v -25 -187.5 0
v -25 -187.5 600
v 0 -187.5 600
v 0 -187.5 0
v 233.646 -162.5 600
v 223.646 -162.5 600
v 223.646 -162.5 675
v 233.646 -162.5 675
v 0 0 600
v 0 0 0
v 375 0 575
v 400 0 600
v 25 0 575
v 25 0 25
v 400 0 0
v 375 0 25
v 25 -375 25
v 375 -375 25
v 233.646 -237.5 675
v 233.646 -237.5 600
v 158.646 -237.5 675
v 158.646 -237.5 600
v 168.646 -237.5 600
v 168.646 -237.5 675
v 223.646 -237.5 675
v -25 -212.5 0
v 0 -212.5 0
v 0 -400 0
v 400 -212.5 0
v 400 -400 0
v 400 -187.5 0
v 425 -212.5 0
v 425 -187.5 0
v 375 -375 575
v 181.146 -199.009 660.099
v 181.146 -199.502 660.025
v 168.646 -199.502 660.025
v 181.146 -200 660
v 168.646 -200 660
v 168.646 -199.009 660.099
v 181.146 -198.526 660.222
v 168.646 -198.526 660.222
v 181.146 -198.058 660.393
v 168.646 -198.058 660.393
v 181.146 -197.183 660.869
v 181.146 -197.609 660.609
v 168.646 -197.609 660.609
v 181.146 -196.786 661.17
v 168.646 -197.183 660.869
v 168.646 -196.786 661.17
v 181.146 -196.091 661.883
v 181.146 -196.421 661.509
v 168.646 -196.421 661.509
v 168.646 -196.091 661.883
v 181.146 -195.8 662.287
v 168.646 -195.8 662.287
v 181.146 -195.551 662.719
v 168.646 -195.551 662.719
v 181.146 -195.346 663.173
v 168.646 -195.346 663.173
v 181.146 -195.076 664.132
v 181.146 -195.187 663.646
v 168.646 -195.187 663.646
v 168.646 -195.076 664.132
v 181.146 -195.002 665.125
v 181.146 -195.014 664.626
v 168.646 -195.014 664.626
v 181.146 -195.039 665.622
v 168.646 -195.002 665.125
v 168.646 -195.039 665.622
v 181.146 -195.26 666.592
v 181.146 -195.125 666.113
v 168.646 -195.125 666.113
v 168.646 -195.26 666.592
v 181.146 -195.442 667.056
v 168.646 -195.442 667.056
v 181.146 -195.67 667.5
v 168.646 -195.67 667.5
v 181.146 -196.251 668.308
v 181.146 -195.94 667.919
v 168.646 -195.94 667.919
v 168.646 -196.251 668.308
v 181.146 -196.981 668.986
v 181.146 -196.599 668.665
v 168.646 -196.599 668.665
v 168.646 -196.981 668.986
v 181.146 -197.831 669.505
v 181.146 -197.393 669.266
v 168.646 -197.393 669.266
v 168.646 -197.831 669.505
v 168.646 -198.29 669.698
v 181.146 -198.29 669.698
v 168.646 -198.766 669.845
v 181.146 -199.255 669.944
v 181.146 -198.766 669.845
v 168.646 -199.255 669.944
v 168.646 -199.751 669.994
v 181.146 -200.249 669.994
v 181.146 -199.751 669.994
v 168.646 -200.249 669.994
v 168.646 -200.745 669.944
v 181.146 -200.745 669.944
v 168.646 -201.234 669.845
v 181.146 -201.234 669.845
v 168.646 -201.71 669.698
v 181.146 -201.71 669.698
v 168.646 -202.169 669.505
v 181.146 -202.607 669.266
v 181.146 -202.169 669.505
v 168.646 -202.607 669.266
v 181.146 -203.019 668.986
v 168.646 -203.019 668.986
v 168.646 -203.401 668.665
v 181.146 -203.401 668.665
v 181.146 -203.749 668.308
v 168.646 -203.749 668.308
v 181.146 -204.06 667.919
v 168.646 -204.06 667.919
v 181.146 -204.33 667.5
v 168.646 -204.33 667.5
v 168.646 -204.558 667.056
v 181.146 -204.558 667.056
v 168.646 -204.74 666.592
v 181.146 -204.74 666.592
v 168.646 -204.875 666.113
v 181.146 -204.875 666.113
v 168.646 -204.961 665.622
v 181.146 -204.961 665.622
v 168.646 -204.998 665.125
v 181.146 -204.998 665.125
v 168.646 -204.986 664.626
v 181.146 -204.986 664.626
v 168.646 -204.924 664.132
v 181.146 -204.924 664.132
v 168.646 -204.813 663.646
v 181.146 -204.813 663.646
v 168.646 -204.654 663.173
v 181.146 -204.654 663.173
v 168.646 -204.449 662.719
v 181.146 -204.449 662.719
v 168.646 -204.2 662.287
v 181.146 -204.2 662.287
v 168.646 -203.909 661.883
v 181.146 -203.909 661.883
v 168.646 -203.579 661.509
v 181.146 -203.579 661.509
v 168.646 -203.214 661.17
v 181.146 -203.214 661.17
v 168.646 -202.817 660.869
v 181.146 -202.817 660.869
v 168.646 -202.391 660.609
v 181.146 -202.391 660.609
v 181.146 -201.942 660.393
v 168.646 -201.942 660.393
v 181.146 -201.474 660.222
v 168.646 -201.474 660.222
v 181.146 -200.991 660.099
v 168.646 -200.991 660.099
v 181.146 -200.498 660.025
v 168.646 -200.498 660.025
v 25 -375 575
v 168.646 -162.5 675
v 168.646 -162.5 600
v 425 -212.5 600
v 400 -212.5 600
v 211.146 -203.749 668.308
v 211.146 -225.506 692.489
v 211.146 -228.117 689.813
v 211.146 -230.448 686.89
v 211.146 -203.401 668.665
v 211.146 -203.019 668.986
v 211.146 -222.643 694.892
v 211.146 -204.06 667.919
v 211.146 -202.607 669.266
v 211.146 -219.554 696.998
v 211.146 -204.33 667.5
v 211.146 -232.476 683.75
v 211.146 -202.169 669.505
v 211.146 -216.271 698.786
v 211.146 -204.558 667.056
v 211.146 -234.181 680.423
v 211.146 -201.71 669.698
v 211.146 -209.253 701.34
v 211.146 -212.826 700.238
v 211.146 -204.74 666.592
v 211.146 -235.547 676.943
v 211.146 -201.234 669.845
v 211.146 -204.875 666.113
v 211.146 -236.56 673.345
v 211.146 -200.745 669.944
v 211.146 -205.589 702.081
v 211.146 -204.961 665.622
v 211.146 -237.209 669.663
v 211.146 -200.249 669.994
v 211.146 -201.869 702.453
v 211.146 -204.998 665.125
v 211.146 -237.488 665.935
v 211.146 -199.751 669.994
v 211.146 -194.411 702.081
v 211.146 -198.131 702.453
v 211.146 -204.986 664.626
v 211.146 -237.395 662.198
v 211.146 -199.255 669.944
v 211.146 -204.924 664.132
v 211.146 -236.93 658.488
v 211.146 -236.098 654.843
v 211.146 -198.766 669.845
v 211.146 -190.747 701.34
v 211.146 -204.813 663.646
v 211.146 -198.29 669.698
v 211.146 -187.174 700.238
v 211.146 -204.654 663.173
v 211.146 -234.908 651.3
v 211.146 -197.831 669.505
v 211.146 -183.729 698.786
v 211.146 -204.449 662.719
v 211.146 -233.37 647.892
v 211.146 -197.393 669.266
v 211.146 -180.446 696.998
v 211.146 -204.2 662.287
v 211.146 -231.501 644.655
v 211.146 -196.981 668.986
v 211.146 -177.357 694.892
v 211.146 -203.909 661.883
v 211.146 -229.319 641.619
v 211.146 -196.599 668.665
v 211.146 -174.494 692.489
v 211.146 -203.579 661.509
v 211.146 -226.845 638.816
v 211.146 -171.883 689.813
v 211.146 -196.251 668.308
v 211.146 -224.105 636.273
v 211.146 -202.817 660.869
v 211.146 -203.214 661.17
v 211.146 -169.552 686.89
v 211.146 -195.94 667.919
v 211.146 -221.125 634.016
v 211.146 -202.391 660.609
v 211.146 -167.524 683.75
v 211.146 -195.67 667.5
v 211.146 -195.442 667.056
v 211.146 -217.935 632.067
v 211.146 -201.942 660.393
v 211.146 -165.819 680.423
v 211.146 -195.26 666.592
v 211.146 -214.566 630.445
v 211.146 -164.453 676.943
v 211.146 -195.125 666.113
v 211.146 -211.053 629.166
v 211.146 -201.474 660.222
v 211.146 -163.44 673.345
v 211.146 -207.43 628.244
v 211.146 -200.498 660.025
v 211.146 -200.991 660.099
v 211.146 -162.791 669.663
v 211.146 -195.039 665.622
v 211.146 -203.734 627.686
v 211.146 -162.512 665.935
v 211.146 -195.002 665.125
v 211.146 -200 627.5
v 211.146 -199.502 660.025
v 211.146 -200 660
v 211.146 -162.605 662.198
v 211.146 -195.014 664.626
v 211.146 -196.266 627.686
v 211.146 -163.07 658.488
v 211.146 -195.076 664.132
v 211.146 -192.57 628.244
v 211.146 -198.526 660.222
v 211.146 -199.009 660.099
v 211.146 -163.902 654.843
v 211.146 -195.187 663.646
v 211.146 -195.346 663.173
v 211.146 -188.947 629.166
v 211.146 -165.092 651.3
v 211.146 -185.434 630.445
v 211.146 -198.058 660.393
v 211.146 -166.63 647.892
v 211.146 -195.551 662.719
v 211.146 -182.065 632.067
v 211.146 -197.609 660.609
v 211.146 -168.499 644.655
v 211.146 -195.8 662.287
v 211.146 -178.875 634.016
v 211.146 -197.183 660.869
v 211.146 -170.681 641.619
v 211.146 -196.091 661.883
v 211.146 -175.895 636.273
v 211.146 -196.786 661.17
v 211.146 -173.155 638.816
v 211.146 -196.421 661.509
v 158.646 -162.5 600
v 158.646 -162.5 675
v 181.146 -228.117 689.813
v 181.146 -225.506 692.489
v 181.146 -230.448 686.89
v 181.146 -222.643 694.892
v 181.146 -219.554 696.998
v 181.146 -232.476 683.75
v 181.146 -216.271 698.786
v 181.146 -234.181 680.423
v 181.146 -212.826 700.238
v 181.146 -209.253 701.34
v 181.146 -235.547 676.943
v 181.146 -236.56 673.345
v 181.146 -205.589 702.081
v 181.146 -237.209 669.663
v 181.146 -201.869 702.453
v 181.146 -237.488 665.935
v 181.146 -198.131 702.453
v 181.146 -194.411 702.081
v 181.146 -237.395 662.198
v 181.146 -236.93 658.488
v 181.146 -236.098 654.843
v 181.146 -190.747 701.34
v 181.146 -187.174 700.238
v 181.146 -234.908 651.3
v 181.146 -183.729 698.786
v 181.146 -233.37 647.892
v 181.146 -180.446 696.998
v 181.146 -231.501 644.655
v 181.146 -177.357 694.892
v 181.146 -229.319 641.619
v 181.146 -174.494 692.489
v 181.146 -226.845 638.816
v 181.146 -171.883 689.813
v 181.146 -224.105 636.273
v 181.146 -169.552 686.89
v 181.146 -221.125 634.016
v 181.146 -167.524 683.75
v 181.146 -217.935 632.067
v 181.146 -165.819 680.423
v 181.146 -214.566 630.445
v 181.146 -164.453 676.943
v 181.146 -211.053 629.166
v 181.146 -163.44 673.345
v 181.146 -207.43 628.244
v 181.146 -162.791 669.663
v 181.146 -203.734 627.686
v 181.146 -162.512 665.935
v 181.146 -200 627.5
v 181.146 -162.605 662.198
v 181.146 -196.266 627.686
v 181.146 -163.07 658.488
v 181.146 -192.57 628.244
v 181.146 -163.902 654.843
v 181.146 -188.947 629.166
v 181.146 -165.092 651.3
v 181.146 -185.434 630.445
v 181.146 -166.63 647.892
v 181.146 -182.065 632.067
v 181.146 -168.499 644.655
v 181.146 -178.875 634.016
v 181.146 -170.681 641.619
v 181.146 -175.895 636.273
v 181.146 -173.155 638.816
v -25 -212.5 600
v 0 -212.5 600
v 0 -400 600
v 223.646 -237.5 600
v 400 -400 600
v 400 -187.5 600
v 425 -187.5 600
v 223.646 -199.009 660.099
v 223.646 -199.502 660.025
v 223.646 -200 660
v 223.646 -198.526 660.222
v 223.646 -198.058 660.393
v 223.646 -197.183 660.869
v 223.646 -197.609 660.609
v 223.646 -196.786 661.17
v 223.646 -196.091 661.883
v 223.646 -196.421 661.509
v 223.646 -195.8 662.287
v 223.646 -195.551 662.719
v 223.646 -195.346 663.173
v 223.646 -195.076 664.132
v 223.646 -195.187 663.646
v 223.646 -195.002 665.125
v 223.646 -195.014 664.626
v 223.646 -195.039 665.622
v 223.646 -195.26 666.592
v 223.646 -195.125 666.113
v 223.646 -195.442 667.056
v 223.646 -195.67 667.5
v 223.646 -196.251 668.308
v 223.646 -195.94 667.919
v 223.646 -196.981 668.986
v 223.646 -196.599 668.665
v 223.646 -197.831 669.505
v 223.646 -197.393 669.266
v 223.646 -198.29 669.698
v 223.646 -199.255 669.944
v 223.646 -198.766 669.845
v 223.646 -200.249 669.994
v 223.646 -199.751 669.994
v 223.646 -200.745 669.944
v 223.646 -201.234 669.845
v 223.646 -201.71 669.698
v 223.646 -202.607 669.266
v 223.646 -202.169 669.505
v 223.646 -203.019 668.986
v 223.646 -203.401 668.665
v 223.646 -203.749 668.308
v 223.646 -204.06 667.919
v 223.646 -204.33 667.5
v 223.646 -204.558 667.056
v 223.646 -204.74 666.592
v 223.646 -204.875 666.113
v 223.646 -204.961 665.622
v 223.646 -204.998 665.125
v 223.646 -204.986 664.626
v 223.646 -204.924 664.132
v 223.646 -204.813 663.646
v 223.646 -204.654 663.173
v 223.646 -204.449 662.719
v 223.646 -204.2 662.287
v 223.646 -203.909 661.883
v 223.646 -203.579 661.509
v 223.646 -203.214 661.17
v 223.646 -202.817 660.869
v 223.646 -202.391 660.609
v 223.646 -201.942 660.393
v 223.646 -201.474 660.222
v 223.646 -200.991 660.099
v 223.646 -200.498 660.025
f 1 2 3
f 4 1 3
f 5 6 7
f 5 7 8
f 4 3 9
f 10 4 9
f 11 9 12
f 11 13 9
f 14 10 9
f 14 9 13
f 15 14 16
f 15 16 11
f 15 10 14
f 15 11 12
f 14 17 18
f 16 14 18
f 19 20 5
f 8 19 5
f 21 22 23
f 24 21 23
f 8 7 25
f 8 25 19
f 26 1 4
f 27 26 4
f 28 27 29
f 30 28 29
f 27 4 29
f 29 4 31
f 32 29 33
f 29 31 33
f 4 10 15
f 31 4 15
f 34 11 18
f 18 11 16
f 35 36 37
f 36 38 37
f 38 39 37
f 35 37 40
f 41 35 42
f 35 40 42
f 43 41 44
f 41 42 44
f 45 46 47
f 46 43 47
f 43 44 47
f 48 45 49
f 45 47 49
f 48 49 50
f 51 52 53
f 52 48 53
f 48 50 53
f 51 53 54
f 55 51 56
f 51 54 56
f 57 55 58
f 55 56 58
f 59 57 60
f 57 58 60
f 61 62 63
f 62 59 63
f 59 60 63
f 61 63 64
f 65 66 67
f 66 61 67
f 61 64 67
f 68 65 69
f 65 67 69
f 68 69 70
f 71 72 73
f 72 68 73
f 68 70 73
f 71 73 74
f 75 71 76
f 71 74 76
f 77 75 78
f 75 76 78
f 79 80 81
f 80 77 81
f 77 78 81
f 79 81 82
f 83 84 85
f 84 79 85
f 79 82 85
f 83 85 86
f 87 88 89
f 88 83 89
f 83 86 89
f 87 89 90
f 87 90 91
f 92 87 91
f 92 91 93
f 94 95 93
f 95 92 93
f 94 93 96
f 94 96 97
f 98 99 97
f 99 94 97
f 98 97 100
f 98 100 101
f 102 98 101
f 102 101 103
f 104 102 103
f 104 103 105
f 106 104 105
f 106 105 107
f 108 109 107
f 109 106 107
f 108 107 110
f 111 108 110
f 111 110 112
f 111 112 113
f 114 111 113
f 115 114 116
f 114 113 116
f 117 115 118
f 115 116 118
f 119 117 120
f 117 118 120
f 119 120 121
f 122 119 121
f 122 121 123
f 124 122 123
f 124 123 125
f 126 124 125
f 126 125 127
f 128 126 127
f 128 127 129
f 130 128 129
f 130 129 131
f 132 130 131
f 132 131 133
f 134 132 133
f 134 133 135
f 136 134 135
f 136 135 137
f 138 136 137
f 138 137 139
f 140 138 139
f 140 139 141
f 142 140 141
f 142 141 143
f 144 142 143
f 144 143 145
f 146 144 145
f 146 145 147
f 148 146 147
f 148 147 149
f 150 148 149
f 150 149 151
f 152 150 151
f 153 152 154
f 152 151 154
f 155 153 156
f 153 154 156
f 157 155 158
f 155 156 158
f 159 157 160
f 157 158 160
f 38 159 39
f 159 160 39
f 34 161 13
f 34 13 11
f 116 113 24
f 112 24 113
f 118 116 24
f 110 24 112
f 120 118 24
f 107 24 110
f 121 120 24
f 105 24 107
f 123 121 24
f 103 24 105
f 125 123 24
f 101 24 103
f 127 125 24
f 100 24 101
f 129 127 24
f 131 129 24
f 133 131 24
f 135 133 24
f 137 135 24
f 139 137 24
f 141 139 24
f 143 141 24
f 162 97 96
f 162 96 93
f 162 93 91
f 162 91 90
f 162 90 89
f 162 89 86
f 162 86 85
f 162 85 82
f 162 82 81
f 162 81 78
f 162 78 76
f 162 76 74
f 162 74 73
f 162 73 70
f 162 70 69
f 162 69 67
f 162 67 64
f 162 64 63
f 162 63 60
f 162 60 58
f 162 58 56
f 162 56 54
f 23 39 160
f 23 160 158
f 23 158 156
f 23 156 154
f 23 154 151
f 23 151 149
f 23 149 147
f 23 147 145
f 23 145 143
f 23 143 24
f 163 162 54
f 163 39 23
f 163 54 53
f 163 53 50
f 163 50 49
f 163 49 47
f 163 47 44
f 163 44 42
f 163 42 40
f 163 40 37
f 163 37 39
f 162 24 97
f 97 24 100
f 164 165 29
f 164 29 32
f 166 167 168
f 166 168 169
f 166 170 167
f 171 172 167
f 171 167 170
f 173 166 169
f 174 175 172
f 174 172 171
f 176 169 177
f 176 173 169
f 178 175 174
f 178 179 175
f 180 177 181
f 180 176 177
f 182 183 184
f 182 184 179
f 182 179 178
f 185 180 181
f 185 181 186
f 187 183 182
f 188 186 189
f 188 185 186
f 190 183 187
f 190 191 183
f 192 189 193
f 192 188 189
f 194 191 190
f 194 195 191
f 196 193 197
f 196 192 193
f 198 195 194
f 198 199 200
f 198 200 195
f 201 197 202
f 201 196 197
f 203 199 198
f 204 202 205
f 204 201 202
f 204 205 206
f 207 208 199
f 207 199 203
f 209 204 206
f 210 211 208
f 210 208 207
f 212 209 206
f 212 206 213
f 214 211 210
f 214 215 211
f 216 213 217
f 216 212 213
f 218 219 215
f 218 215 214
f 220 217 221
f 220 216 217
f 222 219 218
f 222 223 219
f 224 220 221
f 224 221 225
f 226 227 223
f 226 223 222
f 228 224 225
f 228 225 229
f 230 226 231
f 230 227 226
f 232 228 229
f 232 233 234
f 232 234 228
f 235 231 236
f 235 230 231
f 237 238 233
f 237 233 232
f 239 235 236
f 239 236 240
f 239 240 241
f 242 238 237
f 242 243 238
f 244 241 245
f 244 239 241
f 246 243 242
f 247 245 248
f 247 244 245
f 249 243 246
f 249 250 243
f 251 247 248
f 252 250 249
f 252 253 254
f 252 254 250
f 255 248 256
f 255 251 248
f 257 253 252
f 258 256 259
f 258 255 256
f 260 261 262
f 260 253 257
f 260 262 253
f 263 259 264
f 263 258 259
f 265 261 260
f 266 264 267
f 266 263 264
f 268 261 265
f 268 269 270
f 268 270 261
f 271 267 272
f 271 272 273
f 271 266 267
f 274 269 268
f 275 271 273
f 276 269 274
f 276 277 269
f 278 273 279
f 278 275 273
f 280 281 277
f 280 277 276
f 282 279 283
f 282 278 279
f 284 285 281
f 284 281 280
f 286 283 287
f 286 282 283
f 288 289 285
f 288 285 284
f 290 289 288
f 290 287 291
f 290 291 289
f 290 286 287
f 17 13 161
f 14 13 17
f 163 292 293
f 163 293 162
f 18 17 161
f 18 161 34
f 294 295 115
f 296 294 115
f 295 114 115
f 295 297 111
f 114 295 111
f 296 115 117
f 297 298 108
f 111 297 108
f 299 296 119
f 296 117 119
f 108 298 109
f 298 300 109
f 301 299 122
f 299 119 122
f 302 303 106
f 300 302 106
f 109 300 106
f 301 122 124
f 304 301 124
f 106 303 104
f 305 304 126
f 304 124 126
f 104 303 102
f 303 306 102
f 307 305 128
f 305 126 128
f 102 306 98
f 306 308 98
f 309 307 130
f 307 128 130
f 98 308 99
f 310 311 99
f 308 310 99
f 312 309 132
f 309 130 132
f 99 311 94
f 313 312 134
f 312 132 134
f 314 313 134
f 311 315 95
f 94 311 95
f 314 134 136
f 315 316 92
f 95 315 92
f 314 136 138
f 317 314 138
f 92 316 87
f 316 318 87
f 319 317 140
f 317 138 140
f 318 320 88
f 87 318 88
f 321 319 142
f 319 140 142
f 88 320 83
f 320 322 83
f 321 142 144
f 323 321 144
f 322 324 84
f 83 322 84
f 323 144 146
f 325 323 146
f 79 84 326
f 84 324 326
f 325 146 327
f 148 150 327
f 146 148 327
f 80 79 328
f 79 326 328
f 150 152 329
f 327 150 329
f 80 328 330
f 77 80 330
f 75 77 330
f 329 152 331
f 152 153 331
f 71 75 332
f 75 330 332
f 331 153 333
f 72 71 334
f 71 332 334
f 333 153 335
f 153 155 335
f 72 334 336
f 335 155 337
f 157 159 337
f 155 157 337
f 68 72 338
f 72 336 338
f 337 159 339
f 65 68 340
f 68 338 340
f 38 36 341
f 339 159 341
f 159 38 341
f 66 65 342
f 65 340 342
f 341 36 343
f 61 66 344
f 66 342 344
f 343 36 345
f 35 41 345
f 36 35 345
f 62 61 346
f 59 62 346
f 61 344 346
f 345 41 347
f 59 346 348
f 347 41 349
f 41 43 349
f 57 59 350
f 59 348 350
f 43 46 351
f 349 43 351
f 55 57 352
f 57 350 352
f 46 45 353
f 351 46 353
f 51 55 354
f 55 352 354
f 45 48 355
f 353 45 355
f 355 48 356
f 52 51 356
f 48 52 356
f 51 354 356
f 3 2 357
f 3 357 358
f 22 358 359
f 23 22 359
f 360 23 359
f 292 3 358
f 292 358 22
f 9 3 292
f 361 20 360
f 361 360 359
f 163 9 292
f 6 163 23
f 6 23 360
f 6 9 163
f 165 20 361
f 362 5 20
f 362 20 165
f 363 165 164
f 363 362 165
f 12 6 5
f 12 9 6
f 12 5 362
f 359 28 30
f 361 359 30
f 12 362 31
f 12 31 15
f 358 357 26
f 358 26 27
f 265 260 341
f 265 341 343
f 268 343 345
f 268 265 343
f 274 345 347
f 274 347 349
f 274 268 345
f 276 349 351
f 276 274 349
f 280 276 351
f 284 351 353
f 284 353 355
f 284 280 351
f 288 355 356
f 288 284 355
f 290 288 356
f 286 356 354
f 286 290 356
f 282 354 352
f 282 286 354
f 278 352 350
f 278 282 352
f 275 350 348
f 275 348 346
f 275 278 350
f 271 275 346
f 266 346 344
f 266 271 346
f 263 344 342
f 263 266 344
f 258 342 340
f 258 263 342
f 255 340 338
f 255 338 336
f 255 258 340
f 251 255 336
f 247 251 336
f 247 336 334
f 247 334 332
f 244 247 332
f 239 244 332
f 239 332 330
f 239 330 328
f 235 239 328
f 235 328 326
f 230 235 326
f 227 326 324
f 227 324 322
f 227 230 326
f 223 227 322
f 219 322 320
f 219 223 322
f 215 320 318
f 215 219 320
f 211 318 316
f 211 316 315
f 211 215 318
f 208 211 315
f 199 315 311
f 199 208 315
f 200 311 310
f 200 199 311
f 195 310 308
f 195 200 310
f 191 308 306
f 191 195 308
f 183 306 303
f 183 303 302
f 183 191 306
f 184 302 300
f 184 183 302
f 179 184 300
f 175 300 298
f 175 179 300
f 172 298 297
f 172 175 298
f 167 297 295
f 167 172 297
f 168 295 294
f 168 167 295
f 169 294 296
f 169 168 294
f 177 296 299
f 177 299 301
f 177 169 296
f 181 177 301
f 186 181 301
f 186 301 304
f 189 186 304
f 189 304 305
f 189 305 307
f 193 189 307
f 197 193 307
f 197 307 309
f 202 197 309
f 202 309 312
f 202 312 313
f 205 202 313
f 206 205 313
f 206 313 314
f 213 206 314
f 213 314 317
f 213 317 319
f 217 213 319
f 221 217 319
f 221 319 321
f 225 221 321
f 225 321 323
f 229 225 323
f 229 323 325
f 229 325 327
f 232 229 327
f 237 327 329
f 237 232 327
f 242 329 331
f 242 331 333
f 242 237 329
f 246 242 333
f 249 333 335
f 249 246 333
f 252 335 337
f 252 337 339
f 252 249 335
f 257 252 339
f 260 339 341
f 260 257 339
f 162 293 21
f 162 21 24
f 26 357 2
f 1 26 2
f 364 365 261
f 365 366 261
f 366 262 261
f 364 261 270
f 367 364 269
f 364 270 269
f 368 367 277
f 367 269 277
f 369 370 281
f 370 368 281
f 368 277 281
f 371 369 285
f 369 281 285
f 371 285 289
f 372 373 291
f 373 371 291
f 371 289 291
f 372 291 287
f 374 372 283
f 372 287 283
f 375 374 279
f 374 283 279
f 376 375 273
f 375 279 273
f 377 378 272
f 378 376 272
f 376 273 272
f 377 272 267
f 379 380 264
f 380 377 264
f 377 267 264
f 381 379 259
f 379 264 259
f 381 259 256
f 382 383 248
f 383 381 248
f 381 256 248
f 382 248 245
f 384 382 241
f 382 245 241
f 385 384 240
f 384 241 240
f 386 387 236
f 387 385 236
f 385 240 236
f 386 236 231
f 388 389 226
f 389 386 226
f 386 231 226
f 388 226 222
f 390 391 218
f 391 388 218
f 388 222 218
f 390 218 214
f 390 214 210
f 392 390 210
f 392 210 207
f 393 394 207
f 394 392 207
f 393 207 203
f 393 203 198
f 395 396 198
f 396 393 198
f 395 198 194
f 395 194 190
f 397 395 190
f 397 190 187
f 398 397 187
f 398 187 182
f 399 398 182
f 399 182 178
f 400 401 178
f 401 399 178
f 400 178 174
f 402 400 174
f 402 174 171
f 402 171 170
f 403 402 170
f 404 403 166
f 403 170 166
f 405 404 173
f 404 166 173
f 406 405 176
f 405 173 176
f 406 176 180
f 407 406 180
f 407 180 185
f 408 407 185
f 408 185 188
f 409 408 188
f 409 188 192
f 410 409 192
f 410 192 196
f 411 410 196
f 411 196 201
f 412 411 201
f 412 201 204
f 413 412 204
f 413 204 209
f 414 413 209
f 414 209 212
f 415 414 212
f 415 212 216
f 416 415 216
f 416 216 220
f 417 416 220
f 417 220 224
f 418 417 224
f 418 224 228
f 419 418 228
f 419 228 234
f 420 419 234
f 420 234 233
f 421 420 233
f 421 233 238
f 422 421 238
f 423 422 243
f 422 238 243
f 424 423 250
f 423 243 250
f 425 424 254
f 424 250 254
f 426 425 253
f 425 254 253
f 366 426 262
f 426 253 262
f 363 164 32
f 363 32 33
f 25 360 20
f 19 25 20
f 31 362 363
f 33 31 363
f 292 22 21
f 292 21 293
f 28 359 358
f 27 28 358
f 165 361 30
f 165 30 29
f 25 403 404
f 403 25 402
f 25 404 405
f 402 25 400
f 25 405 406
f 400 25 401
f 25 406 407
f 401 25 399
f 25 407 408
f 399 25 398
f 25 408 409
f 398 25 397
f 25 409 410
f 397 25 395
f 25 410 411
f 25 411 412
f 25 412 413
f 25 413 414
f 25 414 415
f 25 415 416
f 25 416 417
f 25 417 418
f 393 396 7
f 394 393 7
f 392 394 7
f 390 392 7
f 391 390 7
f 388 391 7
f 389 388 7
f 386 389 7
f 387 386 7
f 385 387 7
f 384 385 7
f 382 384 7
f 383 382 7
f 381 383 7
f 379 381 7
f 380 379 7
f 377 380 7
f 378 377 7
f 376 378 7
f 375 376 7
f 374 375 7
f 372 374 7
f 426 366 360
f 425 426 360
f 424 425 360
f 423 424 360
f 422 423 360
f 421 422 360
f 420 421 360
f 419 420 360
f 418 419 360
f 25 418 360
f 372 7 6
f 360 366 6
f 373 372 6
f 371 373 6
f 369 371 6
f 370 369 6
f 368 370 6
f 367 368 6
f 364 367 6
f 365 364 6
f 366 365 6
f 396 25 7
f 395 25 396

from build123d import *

# Parameters (mm, degrees)
SKETCH1_W                = 400
SKETCH1_H                = 400
BOSS_EXTRUDE1_DEPTH      = 600
SKETCH2_W                = 350
SKETCH2_H                = 550
CUT_EXTRUDE1_DEPTH       = 375
SKETCH3_W                = 25
SKETCH3_H                = 25
BOSS_EXTRUDE2_DEPTH      = 600
SKETCH4_W                = 75
SKETCH4_H                = 75
BOSS_EXTRUDE3_DEPTH      = 75
SKETCH5_W                = 55
SKETCH5_H                = 75
CUT_EXTRUDE2_DEPTH       = 75
BOSS_EXTRUDE4_START      = -22.5
SKETCH6_R                = 37.5
BOSS_EXTRUDE4_DEPTH      = 30
BOSS_EXTRUDE5_DEPTH      = 22
BOSS_EXTRUDE5_DEPTH_BACK = 44
SKETCH7_R                = 5


with BuildPart() as part:
    # Sketch1 → Boss-Extrude1 (new body)
    with BuildSketch(Plane.XY):
        with Locations((200, -200)):
            Rectangle(SKETCH1_W, SKETCH1_H)
    extrude(amount=BOSS_EXTRUDE1_DEPTH)

    # Sketch2 → Cut-Extrude1 (cut)
    with BuildSketch(Plane(origin=(0, 0, 0), x_dir=(1, 0, 0), z_dir=(0, 1, 0))):
        with Locations((200, -300)):
            Rectangle(SKETCH2_W, SKETCH2_H)
    extrude(amount=-CUT_EXTRUDE1_DEPTH, mode=Mode.SUBTRACT)

    # Sketch3 → Boss-Extrude2 (add)
    with BuildSketch(Plane.XY.offset(600)):
        with Locations((412.5, -200)):
            Rectangle(SKETCH3_W, SKETCH3_H)
        with Locations((-12.5, -200)):
            Rectangle(SKETCH3_W, SKETCH3_H)
    extrude(amount=-BOSS_EXTRUDE2_DEPTH)

    # Sketch4 → Boss-Extrude3 (add)
    with BuildSketch(Plane.XY.offset(600)):
        with Locations((196.145511261, -200)):
            Rectangle(SKETCH4_W, SKETCH4_H)
    extrude(amount=BOSS_EXTRUDE3_DEPTH)

    # Sketch5 → Cut-Extrude2 (cut)
    with BuildSketch(Plane(origin=(0, -162.5, 0), x_dir=(1, 0, 0), z_dir=(0, 1, 0))):
        with Locations((196.145511261, -637.5)):
            Rectangle(SKETCH5_W, SKETCH5_H)
    extrude(amount=-CUT_EXTRUDE2_DEPTH, mode=Mode.SUBTRACT)



with BuildPart() as body_2:
    # Sketch6 → Boss-Extrude4 (new body)
    with BuildSketch(Plane(origin=(233.645511261, 0, 0), x_dir=(0, 0, -1), z_dir=(1, 0, 0)).offset(BOSS_EXTRUDE4_START)):
        with Locations((-665, -200)):
            Circle(SKETCH6_R)
    extrude(amount=-BOSS_EXTRUDE4_DEPTH)


with BuildPart() as part_1:
    add(part.part)

    add(body_2.part)  # Boss-Extrude5 merges body 2
    # Sketch7 → Boss-Extrude5 (add, two sides: drawn at the far end of the back side and taken through both)
    with BuildSketch(Plane(origin=(211.145511261, 0, 0), x_dir=(0, 0, -1), z_dir=(1, 0, 0)).offset(-BOSS_EXTRUDE5_DEPTH_BACK)):
        with Locations((-665, -200)):
            Circle(SKETCH7_R)
    extrude(amount=BOSS_EXTRUDE5_DEPTH + BOSS_EXTRUDE5_DEPTH_BACK)


solid = part_1.part
